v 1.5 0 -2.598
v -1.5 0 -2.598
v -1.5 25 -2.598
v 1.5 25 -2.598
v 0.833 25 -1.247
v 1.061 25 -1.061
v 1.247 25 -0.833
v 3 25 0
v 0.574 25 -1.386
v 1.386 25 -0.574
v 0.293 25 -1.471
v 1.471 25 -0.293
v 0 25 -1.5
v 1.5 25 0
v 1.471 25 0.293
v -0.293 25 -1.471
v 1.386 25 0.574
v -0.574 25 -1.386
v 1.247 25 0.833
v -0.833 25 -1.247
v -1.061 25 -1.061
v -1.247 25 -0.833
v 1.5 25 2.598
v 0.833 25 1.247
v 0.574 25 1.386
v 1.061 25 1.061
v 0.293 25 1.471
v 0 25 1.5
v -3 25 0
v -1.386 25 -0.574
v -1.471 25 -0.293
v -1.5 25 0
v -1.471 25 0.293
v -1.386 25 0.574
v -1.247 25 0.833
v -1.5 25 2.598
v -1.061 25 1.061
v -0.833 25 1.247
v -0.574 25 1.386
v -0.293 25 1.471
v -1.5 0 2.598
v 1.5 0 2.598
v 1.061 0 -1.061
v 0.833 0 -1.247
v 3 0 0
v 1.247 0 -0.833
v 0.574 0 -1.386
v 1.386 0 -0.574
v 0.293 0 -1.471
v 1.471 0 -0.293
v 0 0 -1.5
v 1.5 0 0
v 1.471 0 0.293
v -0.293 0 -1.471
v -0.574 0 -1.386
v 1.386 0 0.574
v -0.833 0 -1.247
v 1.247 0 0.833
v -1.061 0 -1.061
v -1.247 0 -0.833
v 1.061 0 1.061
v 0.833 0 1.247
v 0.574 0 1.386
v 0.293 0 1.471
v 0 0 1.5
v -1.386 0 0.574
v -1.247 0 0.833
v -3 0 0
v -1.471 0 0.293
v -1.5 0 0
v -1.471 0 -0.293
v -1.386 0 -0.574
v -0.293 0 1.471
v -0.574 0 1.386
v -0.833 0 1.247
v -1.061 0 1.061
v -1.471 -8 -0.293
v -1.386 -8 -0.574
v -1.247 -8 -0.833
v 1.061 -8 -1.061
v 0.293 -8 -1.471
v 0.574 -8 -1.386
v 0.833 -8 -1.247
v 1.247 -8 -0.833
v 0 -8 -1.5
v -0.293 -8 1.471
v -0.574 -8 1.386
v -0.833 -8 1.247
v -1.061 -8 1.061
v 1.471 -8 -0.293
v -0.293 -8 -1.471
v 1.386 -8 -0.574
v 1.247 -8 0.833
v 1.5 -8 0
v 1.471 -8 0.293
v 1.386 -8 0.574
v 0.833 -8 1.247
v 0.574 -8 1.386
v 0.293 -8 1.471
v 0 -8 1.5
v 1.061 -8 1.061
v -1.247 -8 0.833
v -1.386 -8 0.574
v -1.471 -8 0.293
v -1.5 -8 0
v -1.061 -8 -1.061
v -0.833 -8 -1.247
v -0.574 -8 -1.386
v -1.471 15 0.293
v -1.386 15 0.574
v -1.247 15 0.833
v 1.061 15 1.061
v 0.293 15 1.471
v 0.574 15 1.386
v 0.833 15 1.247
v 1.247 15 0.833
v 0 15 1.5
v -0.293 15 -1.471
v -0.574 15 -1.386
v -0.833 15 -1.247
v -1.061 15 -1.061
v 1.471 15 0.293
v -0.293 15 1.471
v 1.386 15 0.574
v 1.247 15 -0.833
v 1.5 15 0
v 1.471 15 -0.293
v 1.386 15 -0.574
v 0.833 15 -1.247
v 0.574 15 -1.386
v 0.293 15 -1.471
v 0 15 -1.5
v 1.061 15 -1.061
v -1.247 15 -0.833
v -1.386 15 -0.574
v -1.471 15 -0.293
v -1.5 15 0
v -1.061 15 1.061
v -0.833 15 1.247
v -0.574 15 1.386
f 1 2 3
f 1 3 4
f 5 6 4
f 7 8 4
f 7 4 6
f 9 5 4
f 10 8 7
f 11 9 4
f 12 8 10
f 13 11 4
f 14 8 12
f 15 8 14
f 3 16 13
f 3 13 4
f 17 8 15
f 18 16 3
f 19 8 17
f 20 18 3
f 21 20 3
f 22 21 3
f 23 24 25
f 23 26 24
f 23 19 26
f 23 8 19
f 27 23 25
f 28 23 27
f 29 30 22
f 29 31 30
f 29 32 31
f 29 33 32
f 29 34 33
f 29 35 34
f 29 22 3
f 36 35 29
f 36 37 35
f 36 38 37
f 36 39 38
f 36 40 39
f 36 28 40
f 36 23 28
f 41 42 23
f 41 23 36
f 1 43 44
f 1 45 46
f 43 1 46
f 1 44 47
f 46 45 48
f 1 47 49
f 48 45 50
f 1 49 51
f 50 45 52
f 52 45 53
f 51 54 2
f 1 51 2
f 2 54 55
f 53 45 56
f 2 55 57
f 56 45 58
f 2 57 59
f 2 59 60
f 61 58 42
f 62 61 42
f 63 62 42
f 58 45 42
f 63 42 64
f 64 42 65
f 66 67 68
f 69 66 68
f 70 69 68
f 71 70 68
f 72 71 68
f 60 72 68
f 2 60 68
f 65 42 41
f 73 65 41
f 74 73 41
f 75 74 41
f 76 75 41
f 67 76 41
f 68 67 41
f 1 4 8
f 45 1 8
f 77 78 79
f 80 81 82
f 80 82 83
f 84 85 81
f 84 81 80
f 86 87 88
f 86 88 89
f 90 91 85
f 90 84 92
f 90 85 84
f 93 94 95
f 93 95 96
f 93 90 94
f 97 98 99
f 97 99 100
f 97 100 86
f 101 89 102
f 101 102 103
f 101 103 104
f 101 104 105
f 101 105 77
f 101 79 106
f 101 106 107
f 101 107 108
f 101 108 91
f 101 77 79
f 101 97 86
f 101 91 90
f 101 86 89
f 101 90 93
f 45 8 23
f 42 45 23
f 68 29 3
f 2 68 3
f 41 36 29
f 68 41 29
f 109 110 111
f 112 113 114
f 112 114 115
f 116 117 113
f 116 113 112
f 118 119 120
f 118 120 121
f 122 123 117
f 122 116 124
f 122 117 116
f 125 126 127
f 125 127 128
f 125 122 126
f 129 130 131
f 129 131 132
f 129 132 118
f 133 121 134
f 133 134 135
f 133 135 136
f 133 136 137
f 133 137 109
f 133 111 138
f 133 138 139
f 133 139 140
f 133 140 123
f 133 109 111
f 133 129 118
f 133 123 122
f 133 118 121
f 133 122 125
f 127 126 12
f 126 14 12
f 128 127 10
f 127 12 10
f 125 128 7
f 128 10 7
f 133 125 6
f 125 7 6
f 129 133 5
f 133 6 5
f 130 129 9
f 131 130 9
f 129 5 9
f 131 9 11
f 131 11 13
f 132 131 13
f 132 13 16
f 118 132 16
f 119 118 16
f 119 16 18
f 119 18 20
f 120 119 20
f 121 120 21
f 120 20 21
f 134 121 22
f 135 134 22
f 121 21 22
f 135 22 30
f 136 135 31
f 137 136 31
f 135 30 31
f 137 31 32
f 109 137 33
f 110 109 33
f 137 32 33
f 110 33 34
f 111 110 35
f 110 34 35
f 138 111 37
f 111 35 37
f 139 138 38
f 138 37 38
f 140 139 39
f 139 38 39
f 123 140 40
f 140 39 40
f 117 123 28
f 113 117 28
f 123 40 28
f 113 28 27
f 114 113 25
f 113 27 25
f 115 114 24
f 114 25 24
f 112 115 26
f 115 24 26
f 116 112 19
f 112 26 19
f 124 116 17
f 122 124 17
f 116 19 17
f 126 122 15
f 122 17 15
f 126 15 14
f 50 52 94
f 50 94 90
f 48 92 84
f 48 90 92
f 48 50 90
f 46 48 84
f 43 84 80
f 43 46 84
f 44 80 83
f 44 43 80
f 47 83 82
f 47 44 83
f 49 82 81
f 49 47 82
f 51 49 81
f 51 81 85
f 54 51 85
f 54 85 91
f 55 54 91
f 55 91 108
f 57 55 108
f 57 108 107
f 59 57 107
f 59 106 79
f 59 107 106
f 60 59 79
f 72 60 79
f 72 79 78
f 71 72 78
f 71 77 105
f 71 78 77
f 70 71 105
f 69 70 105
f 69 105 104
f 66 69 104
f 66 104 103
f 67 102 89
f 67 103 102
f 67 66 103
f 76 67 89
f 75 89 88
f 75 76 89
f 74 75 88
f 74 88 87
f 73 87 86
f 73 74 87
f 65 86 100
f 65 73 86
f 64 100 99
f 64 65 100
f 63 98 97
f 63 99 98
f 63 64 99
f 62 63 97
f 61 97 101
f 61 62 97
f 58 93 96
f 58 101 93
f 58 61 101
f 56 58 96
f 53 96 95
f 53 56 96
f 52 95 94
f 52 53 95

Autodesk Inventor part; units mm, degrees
ref_plane "YZ Plane" through (0, 0, 0) normal (1, 0, 0) x (0, 1, 0)
ref_plane "XZ Plane" through (0, 0, 0) normal (0, 1, 0) x (-1, 0, 0)
ref_plane "XY Plane" through (0, 0, 0) normal (0, 0, 1) x (1, 0, 0)
sketch "Sketch1" plane through (0, 0, 0) normal (0, 1, 0) x (-1, 0, 0)
  line L0 (-3, 0) -> (-1.5, 2.5981)
  line L1 (-1.5, 2.5981) -> (1.5, 2.5981)
  line L2 (1.5, 2.5981) -> (3, 0)
  line L3 (3, 0) -> (1.5, -2.5981)
  line L4 (1.5, -2.5981) -> (-1.5, -2.5981)
  line L5 (-1.5, -2.5981) -> (-3, 0)
  point P0 (0, 0)
  point P1 (0, 0)
  dimension "d0" = 6
sketch "Sketch2" plane through (0, 0, 0) normal (0, 1, 0) x (-1, 0, 0)
  point P0 (0, 0)
extrude "Extrusion1" add sketch "Sketch1" along normal blind 25
sketch "Sketch3" plane through (0, 0, 0) normal (0, -1, 0) x (1, 0, 0)
  circle A0 centre (0, 0) radius 1.5
  dimension "d3" = 3
sketch "Sketch4" plane through (0, 25, 0) normal (0, 1, 0) x (1, 0, 0)
  circle A0 centre (0, 0) radius 1.5
  dimension "d4" = 3
extrude "Extrusion2" add sketch "Sketch3" along normal blind 8
extrude "Extrusion3" cut sketch "Sketch4" against normal blind 10
properties part number "Spacer25mm" material "Brass, Soft Yellow"
